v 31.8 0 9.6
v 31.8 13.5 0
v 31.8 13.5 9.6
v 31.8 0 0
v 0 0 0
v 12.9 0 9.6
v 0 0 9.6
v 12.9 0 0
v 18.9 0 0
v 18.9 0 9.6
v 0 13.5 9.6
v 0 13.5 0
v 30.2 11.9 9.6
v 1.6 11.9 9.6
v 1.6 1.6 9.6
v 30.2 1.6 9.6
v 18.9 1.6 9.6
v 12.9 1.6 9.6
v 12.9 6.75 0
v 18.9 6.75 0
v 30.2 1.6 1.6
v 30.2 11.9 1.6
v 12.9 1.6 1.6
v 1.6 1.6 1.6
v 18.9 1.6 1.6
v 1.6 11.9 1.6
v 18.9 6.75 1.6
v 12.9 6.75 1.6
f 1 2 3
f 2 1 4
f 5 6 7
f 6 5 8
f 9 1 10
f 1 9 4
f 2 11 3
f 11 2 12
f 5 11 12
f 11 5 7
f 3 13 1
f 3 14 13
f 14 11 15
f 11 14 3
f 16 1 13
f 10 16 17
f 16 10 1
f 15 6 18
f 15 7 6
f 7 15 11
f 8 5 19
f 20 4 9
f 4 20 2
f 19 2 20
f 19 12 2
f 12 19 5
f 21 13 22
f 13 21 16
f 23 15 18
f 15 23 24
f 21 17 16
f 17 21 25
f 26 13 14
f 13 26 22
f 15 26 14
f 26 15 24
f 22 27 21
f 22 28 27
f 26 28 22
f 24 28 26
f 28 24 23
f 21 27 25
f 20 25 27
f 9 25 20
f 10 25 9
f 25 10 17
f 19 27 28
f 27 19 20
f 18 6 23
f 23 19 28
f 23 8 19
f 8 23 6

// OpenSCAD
// Matching external cap for the supplied sleeve; units: mm.
// Exported STLs are already oriented with the end face on the print bed.
clearance = 0.20; // per side; looser version uses 0.35
wall = 1.6;
overlap = 8;
wire_width = 6;
module cap() {
 difference() {
  translate([-clearance-wall,-wall,-clearance-wall])
   cube([28.2+2*(clearance+wall),overlap+wall,9.9+2*(clearance+wall)]);
  translate([-clearance,0,-clearance])
   cube([28.2+2*clearance,overlap+1,9.9+2*clearance]);
  translate([(28.2-wire_width)/2,-wall-1,4.95])
   cube([wire_width,overlap+wall+2,10]);
 }
}
translate([clearance+wall,9.9+clearance+wall,wall]) rotate([90,0,0]) cap();
